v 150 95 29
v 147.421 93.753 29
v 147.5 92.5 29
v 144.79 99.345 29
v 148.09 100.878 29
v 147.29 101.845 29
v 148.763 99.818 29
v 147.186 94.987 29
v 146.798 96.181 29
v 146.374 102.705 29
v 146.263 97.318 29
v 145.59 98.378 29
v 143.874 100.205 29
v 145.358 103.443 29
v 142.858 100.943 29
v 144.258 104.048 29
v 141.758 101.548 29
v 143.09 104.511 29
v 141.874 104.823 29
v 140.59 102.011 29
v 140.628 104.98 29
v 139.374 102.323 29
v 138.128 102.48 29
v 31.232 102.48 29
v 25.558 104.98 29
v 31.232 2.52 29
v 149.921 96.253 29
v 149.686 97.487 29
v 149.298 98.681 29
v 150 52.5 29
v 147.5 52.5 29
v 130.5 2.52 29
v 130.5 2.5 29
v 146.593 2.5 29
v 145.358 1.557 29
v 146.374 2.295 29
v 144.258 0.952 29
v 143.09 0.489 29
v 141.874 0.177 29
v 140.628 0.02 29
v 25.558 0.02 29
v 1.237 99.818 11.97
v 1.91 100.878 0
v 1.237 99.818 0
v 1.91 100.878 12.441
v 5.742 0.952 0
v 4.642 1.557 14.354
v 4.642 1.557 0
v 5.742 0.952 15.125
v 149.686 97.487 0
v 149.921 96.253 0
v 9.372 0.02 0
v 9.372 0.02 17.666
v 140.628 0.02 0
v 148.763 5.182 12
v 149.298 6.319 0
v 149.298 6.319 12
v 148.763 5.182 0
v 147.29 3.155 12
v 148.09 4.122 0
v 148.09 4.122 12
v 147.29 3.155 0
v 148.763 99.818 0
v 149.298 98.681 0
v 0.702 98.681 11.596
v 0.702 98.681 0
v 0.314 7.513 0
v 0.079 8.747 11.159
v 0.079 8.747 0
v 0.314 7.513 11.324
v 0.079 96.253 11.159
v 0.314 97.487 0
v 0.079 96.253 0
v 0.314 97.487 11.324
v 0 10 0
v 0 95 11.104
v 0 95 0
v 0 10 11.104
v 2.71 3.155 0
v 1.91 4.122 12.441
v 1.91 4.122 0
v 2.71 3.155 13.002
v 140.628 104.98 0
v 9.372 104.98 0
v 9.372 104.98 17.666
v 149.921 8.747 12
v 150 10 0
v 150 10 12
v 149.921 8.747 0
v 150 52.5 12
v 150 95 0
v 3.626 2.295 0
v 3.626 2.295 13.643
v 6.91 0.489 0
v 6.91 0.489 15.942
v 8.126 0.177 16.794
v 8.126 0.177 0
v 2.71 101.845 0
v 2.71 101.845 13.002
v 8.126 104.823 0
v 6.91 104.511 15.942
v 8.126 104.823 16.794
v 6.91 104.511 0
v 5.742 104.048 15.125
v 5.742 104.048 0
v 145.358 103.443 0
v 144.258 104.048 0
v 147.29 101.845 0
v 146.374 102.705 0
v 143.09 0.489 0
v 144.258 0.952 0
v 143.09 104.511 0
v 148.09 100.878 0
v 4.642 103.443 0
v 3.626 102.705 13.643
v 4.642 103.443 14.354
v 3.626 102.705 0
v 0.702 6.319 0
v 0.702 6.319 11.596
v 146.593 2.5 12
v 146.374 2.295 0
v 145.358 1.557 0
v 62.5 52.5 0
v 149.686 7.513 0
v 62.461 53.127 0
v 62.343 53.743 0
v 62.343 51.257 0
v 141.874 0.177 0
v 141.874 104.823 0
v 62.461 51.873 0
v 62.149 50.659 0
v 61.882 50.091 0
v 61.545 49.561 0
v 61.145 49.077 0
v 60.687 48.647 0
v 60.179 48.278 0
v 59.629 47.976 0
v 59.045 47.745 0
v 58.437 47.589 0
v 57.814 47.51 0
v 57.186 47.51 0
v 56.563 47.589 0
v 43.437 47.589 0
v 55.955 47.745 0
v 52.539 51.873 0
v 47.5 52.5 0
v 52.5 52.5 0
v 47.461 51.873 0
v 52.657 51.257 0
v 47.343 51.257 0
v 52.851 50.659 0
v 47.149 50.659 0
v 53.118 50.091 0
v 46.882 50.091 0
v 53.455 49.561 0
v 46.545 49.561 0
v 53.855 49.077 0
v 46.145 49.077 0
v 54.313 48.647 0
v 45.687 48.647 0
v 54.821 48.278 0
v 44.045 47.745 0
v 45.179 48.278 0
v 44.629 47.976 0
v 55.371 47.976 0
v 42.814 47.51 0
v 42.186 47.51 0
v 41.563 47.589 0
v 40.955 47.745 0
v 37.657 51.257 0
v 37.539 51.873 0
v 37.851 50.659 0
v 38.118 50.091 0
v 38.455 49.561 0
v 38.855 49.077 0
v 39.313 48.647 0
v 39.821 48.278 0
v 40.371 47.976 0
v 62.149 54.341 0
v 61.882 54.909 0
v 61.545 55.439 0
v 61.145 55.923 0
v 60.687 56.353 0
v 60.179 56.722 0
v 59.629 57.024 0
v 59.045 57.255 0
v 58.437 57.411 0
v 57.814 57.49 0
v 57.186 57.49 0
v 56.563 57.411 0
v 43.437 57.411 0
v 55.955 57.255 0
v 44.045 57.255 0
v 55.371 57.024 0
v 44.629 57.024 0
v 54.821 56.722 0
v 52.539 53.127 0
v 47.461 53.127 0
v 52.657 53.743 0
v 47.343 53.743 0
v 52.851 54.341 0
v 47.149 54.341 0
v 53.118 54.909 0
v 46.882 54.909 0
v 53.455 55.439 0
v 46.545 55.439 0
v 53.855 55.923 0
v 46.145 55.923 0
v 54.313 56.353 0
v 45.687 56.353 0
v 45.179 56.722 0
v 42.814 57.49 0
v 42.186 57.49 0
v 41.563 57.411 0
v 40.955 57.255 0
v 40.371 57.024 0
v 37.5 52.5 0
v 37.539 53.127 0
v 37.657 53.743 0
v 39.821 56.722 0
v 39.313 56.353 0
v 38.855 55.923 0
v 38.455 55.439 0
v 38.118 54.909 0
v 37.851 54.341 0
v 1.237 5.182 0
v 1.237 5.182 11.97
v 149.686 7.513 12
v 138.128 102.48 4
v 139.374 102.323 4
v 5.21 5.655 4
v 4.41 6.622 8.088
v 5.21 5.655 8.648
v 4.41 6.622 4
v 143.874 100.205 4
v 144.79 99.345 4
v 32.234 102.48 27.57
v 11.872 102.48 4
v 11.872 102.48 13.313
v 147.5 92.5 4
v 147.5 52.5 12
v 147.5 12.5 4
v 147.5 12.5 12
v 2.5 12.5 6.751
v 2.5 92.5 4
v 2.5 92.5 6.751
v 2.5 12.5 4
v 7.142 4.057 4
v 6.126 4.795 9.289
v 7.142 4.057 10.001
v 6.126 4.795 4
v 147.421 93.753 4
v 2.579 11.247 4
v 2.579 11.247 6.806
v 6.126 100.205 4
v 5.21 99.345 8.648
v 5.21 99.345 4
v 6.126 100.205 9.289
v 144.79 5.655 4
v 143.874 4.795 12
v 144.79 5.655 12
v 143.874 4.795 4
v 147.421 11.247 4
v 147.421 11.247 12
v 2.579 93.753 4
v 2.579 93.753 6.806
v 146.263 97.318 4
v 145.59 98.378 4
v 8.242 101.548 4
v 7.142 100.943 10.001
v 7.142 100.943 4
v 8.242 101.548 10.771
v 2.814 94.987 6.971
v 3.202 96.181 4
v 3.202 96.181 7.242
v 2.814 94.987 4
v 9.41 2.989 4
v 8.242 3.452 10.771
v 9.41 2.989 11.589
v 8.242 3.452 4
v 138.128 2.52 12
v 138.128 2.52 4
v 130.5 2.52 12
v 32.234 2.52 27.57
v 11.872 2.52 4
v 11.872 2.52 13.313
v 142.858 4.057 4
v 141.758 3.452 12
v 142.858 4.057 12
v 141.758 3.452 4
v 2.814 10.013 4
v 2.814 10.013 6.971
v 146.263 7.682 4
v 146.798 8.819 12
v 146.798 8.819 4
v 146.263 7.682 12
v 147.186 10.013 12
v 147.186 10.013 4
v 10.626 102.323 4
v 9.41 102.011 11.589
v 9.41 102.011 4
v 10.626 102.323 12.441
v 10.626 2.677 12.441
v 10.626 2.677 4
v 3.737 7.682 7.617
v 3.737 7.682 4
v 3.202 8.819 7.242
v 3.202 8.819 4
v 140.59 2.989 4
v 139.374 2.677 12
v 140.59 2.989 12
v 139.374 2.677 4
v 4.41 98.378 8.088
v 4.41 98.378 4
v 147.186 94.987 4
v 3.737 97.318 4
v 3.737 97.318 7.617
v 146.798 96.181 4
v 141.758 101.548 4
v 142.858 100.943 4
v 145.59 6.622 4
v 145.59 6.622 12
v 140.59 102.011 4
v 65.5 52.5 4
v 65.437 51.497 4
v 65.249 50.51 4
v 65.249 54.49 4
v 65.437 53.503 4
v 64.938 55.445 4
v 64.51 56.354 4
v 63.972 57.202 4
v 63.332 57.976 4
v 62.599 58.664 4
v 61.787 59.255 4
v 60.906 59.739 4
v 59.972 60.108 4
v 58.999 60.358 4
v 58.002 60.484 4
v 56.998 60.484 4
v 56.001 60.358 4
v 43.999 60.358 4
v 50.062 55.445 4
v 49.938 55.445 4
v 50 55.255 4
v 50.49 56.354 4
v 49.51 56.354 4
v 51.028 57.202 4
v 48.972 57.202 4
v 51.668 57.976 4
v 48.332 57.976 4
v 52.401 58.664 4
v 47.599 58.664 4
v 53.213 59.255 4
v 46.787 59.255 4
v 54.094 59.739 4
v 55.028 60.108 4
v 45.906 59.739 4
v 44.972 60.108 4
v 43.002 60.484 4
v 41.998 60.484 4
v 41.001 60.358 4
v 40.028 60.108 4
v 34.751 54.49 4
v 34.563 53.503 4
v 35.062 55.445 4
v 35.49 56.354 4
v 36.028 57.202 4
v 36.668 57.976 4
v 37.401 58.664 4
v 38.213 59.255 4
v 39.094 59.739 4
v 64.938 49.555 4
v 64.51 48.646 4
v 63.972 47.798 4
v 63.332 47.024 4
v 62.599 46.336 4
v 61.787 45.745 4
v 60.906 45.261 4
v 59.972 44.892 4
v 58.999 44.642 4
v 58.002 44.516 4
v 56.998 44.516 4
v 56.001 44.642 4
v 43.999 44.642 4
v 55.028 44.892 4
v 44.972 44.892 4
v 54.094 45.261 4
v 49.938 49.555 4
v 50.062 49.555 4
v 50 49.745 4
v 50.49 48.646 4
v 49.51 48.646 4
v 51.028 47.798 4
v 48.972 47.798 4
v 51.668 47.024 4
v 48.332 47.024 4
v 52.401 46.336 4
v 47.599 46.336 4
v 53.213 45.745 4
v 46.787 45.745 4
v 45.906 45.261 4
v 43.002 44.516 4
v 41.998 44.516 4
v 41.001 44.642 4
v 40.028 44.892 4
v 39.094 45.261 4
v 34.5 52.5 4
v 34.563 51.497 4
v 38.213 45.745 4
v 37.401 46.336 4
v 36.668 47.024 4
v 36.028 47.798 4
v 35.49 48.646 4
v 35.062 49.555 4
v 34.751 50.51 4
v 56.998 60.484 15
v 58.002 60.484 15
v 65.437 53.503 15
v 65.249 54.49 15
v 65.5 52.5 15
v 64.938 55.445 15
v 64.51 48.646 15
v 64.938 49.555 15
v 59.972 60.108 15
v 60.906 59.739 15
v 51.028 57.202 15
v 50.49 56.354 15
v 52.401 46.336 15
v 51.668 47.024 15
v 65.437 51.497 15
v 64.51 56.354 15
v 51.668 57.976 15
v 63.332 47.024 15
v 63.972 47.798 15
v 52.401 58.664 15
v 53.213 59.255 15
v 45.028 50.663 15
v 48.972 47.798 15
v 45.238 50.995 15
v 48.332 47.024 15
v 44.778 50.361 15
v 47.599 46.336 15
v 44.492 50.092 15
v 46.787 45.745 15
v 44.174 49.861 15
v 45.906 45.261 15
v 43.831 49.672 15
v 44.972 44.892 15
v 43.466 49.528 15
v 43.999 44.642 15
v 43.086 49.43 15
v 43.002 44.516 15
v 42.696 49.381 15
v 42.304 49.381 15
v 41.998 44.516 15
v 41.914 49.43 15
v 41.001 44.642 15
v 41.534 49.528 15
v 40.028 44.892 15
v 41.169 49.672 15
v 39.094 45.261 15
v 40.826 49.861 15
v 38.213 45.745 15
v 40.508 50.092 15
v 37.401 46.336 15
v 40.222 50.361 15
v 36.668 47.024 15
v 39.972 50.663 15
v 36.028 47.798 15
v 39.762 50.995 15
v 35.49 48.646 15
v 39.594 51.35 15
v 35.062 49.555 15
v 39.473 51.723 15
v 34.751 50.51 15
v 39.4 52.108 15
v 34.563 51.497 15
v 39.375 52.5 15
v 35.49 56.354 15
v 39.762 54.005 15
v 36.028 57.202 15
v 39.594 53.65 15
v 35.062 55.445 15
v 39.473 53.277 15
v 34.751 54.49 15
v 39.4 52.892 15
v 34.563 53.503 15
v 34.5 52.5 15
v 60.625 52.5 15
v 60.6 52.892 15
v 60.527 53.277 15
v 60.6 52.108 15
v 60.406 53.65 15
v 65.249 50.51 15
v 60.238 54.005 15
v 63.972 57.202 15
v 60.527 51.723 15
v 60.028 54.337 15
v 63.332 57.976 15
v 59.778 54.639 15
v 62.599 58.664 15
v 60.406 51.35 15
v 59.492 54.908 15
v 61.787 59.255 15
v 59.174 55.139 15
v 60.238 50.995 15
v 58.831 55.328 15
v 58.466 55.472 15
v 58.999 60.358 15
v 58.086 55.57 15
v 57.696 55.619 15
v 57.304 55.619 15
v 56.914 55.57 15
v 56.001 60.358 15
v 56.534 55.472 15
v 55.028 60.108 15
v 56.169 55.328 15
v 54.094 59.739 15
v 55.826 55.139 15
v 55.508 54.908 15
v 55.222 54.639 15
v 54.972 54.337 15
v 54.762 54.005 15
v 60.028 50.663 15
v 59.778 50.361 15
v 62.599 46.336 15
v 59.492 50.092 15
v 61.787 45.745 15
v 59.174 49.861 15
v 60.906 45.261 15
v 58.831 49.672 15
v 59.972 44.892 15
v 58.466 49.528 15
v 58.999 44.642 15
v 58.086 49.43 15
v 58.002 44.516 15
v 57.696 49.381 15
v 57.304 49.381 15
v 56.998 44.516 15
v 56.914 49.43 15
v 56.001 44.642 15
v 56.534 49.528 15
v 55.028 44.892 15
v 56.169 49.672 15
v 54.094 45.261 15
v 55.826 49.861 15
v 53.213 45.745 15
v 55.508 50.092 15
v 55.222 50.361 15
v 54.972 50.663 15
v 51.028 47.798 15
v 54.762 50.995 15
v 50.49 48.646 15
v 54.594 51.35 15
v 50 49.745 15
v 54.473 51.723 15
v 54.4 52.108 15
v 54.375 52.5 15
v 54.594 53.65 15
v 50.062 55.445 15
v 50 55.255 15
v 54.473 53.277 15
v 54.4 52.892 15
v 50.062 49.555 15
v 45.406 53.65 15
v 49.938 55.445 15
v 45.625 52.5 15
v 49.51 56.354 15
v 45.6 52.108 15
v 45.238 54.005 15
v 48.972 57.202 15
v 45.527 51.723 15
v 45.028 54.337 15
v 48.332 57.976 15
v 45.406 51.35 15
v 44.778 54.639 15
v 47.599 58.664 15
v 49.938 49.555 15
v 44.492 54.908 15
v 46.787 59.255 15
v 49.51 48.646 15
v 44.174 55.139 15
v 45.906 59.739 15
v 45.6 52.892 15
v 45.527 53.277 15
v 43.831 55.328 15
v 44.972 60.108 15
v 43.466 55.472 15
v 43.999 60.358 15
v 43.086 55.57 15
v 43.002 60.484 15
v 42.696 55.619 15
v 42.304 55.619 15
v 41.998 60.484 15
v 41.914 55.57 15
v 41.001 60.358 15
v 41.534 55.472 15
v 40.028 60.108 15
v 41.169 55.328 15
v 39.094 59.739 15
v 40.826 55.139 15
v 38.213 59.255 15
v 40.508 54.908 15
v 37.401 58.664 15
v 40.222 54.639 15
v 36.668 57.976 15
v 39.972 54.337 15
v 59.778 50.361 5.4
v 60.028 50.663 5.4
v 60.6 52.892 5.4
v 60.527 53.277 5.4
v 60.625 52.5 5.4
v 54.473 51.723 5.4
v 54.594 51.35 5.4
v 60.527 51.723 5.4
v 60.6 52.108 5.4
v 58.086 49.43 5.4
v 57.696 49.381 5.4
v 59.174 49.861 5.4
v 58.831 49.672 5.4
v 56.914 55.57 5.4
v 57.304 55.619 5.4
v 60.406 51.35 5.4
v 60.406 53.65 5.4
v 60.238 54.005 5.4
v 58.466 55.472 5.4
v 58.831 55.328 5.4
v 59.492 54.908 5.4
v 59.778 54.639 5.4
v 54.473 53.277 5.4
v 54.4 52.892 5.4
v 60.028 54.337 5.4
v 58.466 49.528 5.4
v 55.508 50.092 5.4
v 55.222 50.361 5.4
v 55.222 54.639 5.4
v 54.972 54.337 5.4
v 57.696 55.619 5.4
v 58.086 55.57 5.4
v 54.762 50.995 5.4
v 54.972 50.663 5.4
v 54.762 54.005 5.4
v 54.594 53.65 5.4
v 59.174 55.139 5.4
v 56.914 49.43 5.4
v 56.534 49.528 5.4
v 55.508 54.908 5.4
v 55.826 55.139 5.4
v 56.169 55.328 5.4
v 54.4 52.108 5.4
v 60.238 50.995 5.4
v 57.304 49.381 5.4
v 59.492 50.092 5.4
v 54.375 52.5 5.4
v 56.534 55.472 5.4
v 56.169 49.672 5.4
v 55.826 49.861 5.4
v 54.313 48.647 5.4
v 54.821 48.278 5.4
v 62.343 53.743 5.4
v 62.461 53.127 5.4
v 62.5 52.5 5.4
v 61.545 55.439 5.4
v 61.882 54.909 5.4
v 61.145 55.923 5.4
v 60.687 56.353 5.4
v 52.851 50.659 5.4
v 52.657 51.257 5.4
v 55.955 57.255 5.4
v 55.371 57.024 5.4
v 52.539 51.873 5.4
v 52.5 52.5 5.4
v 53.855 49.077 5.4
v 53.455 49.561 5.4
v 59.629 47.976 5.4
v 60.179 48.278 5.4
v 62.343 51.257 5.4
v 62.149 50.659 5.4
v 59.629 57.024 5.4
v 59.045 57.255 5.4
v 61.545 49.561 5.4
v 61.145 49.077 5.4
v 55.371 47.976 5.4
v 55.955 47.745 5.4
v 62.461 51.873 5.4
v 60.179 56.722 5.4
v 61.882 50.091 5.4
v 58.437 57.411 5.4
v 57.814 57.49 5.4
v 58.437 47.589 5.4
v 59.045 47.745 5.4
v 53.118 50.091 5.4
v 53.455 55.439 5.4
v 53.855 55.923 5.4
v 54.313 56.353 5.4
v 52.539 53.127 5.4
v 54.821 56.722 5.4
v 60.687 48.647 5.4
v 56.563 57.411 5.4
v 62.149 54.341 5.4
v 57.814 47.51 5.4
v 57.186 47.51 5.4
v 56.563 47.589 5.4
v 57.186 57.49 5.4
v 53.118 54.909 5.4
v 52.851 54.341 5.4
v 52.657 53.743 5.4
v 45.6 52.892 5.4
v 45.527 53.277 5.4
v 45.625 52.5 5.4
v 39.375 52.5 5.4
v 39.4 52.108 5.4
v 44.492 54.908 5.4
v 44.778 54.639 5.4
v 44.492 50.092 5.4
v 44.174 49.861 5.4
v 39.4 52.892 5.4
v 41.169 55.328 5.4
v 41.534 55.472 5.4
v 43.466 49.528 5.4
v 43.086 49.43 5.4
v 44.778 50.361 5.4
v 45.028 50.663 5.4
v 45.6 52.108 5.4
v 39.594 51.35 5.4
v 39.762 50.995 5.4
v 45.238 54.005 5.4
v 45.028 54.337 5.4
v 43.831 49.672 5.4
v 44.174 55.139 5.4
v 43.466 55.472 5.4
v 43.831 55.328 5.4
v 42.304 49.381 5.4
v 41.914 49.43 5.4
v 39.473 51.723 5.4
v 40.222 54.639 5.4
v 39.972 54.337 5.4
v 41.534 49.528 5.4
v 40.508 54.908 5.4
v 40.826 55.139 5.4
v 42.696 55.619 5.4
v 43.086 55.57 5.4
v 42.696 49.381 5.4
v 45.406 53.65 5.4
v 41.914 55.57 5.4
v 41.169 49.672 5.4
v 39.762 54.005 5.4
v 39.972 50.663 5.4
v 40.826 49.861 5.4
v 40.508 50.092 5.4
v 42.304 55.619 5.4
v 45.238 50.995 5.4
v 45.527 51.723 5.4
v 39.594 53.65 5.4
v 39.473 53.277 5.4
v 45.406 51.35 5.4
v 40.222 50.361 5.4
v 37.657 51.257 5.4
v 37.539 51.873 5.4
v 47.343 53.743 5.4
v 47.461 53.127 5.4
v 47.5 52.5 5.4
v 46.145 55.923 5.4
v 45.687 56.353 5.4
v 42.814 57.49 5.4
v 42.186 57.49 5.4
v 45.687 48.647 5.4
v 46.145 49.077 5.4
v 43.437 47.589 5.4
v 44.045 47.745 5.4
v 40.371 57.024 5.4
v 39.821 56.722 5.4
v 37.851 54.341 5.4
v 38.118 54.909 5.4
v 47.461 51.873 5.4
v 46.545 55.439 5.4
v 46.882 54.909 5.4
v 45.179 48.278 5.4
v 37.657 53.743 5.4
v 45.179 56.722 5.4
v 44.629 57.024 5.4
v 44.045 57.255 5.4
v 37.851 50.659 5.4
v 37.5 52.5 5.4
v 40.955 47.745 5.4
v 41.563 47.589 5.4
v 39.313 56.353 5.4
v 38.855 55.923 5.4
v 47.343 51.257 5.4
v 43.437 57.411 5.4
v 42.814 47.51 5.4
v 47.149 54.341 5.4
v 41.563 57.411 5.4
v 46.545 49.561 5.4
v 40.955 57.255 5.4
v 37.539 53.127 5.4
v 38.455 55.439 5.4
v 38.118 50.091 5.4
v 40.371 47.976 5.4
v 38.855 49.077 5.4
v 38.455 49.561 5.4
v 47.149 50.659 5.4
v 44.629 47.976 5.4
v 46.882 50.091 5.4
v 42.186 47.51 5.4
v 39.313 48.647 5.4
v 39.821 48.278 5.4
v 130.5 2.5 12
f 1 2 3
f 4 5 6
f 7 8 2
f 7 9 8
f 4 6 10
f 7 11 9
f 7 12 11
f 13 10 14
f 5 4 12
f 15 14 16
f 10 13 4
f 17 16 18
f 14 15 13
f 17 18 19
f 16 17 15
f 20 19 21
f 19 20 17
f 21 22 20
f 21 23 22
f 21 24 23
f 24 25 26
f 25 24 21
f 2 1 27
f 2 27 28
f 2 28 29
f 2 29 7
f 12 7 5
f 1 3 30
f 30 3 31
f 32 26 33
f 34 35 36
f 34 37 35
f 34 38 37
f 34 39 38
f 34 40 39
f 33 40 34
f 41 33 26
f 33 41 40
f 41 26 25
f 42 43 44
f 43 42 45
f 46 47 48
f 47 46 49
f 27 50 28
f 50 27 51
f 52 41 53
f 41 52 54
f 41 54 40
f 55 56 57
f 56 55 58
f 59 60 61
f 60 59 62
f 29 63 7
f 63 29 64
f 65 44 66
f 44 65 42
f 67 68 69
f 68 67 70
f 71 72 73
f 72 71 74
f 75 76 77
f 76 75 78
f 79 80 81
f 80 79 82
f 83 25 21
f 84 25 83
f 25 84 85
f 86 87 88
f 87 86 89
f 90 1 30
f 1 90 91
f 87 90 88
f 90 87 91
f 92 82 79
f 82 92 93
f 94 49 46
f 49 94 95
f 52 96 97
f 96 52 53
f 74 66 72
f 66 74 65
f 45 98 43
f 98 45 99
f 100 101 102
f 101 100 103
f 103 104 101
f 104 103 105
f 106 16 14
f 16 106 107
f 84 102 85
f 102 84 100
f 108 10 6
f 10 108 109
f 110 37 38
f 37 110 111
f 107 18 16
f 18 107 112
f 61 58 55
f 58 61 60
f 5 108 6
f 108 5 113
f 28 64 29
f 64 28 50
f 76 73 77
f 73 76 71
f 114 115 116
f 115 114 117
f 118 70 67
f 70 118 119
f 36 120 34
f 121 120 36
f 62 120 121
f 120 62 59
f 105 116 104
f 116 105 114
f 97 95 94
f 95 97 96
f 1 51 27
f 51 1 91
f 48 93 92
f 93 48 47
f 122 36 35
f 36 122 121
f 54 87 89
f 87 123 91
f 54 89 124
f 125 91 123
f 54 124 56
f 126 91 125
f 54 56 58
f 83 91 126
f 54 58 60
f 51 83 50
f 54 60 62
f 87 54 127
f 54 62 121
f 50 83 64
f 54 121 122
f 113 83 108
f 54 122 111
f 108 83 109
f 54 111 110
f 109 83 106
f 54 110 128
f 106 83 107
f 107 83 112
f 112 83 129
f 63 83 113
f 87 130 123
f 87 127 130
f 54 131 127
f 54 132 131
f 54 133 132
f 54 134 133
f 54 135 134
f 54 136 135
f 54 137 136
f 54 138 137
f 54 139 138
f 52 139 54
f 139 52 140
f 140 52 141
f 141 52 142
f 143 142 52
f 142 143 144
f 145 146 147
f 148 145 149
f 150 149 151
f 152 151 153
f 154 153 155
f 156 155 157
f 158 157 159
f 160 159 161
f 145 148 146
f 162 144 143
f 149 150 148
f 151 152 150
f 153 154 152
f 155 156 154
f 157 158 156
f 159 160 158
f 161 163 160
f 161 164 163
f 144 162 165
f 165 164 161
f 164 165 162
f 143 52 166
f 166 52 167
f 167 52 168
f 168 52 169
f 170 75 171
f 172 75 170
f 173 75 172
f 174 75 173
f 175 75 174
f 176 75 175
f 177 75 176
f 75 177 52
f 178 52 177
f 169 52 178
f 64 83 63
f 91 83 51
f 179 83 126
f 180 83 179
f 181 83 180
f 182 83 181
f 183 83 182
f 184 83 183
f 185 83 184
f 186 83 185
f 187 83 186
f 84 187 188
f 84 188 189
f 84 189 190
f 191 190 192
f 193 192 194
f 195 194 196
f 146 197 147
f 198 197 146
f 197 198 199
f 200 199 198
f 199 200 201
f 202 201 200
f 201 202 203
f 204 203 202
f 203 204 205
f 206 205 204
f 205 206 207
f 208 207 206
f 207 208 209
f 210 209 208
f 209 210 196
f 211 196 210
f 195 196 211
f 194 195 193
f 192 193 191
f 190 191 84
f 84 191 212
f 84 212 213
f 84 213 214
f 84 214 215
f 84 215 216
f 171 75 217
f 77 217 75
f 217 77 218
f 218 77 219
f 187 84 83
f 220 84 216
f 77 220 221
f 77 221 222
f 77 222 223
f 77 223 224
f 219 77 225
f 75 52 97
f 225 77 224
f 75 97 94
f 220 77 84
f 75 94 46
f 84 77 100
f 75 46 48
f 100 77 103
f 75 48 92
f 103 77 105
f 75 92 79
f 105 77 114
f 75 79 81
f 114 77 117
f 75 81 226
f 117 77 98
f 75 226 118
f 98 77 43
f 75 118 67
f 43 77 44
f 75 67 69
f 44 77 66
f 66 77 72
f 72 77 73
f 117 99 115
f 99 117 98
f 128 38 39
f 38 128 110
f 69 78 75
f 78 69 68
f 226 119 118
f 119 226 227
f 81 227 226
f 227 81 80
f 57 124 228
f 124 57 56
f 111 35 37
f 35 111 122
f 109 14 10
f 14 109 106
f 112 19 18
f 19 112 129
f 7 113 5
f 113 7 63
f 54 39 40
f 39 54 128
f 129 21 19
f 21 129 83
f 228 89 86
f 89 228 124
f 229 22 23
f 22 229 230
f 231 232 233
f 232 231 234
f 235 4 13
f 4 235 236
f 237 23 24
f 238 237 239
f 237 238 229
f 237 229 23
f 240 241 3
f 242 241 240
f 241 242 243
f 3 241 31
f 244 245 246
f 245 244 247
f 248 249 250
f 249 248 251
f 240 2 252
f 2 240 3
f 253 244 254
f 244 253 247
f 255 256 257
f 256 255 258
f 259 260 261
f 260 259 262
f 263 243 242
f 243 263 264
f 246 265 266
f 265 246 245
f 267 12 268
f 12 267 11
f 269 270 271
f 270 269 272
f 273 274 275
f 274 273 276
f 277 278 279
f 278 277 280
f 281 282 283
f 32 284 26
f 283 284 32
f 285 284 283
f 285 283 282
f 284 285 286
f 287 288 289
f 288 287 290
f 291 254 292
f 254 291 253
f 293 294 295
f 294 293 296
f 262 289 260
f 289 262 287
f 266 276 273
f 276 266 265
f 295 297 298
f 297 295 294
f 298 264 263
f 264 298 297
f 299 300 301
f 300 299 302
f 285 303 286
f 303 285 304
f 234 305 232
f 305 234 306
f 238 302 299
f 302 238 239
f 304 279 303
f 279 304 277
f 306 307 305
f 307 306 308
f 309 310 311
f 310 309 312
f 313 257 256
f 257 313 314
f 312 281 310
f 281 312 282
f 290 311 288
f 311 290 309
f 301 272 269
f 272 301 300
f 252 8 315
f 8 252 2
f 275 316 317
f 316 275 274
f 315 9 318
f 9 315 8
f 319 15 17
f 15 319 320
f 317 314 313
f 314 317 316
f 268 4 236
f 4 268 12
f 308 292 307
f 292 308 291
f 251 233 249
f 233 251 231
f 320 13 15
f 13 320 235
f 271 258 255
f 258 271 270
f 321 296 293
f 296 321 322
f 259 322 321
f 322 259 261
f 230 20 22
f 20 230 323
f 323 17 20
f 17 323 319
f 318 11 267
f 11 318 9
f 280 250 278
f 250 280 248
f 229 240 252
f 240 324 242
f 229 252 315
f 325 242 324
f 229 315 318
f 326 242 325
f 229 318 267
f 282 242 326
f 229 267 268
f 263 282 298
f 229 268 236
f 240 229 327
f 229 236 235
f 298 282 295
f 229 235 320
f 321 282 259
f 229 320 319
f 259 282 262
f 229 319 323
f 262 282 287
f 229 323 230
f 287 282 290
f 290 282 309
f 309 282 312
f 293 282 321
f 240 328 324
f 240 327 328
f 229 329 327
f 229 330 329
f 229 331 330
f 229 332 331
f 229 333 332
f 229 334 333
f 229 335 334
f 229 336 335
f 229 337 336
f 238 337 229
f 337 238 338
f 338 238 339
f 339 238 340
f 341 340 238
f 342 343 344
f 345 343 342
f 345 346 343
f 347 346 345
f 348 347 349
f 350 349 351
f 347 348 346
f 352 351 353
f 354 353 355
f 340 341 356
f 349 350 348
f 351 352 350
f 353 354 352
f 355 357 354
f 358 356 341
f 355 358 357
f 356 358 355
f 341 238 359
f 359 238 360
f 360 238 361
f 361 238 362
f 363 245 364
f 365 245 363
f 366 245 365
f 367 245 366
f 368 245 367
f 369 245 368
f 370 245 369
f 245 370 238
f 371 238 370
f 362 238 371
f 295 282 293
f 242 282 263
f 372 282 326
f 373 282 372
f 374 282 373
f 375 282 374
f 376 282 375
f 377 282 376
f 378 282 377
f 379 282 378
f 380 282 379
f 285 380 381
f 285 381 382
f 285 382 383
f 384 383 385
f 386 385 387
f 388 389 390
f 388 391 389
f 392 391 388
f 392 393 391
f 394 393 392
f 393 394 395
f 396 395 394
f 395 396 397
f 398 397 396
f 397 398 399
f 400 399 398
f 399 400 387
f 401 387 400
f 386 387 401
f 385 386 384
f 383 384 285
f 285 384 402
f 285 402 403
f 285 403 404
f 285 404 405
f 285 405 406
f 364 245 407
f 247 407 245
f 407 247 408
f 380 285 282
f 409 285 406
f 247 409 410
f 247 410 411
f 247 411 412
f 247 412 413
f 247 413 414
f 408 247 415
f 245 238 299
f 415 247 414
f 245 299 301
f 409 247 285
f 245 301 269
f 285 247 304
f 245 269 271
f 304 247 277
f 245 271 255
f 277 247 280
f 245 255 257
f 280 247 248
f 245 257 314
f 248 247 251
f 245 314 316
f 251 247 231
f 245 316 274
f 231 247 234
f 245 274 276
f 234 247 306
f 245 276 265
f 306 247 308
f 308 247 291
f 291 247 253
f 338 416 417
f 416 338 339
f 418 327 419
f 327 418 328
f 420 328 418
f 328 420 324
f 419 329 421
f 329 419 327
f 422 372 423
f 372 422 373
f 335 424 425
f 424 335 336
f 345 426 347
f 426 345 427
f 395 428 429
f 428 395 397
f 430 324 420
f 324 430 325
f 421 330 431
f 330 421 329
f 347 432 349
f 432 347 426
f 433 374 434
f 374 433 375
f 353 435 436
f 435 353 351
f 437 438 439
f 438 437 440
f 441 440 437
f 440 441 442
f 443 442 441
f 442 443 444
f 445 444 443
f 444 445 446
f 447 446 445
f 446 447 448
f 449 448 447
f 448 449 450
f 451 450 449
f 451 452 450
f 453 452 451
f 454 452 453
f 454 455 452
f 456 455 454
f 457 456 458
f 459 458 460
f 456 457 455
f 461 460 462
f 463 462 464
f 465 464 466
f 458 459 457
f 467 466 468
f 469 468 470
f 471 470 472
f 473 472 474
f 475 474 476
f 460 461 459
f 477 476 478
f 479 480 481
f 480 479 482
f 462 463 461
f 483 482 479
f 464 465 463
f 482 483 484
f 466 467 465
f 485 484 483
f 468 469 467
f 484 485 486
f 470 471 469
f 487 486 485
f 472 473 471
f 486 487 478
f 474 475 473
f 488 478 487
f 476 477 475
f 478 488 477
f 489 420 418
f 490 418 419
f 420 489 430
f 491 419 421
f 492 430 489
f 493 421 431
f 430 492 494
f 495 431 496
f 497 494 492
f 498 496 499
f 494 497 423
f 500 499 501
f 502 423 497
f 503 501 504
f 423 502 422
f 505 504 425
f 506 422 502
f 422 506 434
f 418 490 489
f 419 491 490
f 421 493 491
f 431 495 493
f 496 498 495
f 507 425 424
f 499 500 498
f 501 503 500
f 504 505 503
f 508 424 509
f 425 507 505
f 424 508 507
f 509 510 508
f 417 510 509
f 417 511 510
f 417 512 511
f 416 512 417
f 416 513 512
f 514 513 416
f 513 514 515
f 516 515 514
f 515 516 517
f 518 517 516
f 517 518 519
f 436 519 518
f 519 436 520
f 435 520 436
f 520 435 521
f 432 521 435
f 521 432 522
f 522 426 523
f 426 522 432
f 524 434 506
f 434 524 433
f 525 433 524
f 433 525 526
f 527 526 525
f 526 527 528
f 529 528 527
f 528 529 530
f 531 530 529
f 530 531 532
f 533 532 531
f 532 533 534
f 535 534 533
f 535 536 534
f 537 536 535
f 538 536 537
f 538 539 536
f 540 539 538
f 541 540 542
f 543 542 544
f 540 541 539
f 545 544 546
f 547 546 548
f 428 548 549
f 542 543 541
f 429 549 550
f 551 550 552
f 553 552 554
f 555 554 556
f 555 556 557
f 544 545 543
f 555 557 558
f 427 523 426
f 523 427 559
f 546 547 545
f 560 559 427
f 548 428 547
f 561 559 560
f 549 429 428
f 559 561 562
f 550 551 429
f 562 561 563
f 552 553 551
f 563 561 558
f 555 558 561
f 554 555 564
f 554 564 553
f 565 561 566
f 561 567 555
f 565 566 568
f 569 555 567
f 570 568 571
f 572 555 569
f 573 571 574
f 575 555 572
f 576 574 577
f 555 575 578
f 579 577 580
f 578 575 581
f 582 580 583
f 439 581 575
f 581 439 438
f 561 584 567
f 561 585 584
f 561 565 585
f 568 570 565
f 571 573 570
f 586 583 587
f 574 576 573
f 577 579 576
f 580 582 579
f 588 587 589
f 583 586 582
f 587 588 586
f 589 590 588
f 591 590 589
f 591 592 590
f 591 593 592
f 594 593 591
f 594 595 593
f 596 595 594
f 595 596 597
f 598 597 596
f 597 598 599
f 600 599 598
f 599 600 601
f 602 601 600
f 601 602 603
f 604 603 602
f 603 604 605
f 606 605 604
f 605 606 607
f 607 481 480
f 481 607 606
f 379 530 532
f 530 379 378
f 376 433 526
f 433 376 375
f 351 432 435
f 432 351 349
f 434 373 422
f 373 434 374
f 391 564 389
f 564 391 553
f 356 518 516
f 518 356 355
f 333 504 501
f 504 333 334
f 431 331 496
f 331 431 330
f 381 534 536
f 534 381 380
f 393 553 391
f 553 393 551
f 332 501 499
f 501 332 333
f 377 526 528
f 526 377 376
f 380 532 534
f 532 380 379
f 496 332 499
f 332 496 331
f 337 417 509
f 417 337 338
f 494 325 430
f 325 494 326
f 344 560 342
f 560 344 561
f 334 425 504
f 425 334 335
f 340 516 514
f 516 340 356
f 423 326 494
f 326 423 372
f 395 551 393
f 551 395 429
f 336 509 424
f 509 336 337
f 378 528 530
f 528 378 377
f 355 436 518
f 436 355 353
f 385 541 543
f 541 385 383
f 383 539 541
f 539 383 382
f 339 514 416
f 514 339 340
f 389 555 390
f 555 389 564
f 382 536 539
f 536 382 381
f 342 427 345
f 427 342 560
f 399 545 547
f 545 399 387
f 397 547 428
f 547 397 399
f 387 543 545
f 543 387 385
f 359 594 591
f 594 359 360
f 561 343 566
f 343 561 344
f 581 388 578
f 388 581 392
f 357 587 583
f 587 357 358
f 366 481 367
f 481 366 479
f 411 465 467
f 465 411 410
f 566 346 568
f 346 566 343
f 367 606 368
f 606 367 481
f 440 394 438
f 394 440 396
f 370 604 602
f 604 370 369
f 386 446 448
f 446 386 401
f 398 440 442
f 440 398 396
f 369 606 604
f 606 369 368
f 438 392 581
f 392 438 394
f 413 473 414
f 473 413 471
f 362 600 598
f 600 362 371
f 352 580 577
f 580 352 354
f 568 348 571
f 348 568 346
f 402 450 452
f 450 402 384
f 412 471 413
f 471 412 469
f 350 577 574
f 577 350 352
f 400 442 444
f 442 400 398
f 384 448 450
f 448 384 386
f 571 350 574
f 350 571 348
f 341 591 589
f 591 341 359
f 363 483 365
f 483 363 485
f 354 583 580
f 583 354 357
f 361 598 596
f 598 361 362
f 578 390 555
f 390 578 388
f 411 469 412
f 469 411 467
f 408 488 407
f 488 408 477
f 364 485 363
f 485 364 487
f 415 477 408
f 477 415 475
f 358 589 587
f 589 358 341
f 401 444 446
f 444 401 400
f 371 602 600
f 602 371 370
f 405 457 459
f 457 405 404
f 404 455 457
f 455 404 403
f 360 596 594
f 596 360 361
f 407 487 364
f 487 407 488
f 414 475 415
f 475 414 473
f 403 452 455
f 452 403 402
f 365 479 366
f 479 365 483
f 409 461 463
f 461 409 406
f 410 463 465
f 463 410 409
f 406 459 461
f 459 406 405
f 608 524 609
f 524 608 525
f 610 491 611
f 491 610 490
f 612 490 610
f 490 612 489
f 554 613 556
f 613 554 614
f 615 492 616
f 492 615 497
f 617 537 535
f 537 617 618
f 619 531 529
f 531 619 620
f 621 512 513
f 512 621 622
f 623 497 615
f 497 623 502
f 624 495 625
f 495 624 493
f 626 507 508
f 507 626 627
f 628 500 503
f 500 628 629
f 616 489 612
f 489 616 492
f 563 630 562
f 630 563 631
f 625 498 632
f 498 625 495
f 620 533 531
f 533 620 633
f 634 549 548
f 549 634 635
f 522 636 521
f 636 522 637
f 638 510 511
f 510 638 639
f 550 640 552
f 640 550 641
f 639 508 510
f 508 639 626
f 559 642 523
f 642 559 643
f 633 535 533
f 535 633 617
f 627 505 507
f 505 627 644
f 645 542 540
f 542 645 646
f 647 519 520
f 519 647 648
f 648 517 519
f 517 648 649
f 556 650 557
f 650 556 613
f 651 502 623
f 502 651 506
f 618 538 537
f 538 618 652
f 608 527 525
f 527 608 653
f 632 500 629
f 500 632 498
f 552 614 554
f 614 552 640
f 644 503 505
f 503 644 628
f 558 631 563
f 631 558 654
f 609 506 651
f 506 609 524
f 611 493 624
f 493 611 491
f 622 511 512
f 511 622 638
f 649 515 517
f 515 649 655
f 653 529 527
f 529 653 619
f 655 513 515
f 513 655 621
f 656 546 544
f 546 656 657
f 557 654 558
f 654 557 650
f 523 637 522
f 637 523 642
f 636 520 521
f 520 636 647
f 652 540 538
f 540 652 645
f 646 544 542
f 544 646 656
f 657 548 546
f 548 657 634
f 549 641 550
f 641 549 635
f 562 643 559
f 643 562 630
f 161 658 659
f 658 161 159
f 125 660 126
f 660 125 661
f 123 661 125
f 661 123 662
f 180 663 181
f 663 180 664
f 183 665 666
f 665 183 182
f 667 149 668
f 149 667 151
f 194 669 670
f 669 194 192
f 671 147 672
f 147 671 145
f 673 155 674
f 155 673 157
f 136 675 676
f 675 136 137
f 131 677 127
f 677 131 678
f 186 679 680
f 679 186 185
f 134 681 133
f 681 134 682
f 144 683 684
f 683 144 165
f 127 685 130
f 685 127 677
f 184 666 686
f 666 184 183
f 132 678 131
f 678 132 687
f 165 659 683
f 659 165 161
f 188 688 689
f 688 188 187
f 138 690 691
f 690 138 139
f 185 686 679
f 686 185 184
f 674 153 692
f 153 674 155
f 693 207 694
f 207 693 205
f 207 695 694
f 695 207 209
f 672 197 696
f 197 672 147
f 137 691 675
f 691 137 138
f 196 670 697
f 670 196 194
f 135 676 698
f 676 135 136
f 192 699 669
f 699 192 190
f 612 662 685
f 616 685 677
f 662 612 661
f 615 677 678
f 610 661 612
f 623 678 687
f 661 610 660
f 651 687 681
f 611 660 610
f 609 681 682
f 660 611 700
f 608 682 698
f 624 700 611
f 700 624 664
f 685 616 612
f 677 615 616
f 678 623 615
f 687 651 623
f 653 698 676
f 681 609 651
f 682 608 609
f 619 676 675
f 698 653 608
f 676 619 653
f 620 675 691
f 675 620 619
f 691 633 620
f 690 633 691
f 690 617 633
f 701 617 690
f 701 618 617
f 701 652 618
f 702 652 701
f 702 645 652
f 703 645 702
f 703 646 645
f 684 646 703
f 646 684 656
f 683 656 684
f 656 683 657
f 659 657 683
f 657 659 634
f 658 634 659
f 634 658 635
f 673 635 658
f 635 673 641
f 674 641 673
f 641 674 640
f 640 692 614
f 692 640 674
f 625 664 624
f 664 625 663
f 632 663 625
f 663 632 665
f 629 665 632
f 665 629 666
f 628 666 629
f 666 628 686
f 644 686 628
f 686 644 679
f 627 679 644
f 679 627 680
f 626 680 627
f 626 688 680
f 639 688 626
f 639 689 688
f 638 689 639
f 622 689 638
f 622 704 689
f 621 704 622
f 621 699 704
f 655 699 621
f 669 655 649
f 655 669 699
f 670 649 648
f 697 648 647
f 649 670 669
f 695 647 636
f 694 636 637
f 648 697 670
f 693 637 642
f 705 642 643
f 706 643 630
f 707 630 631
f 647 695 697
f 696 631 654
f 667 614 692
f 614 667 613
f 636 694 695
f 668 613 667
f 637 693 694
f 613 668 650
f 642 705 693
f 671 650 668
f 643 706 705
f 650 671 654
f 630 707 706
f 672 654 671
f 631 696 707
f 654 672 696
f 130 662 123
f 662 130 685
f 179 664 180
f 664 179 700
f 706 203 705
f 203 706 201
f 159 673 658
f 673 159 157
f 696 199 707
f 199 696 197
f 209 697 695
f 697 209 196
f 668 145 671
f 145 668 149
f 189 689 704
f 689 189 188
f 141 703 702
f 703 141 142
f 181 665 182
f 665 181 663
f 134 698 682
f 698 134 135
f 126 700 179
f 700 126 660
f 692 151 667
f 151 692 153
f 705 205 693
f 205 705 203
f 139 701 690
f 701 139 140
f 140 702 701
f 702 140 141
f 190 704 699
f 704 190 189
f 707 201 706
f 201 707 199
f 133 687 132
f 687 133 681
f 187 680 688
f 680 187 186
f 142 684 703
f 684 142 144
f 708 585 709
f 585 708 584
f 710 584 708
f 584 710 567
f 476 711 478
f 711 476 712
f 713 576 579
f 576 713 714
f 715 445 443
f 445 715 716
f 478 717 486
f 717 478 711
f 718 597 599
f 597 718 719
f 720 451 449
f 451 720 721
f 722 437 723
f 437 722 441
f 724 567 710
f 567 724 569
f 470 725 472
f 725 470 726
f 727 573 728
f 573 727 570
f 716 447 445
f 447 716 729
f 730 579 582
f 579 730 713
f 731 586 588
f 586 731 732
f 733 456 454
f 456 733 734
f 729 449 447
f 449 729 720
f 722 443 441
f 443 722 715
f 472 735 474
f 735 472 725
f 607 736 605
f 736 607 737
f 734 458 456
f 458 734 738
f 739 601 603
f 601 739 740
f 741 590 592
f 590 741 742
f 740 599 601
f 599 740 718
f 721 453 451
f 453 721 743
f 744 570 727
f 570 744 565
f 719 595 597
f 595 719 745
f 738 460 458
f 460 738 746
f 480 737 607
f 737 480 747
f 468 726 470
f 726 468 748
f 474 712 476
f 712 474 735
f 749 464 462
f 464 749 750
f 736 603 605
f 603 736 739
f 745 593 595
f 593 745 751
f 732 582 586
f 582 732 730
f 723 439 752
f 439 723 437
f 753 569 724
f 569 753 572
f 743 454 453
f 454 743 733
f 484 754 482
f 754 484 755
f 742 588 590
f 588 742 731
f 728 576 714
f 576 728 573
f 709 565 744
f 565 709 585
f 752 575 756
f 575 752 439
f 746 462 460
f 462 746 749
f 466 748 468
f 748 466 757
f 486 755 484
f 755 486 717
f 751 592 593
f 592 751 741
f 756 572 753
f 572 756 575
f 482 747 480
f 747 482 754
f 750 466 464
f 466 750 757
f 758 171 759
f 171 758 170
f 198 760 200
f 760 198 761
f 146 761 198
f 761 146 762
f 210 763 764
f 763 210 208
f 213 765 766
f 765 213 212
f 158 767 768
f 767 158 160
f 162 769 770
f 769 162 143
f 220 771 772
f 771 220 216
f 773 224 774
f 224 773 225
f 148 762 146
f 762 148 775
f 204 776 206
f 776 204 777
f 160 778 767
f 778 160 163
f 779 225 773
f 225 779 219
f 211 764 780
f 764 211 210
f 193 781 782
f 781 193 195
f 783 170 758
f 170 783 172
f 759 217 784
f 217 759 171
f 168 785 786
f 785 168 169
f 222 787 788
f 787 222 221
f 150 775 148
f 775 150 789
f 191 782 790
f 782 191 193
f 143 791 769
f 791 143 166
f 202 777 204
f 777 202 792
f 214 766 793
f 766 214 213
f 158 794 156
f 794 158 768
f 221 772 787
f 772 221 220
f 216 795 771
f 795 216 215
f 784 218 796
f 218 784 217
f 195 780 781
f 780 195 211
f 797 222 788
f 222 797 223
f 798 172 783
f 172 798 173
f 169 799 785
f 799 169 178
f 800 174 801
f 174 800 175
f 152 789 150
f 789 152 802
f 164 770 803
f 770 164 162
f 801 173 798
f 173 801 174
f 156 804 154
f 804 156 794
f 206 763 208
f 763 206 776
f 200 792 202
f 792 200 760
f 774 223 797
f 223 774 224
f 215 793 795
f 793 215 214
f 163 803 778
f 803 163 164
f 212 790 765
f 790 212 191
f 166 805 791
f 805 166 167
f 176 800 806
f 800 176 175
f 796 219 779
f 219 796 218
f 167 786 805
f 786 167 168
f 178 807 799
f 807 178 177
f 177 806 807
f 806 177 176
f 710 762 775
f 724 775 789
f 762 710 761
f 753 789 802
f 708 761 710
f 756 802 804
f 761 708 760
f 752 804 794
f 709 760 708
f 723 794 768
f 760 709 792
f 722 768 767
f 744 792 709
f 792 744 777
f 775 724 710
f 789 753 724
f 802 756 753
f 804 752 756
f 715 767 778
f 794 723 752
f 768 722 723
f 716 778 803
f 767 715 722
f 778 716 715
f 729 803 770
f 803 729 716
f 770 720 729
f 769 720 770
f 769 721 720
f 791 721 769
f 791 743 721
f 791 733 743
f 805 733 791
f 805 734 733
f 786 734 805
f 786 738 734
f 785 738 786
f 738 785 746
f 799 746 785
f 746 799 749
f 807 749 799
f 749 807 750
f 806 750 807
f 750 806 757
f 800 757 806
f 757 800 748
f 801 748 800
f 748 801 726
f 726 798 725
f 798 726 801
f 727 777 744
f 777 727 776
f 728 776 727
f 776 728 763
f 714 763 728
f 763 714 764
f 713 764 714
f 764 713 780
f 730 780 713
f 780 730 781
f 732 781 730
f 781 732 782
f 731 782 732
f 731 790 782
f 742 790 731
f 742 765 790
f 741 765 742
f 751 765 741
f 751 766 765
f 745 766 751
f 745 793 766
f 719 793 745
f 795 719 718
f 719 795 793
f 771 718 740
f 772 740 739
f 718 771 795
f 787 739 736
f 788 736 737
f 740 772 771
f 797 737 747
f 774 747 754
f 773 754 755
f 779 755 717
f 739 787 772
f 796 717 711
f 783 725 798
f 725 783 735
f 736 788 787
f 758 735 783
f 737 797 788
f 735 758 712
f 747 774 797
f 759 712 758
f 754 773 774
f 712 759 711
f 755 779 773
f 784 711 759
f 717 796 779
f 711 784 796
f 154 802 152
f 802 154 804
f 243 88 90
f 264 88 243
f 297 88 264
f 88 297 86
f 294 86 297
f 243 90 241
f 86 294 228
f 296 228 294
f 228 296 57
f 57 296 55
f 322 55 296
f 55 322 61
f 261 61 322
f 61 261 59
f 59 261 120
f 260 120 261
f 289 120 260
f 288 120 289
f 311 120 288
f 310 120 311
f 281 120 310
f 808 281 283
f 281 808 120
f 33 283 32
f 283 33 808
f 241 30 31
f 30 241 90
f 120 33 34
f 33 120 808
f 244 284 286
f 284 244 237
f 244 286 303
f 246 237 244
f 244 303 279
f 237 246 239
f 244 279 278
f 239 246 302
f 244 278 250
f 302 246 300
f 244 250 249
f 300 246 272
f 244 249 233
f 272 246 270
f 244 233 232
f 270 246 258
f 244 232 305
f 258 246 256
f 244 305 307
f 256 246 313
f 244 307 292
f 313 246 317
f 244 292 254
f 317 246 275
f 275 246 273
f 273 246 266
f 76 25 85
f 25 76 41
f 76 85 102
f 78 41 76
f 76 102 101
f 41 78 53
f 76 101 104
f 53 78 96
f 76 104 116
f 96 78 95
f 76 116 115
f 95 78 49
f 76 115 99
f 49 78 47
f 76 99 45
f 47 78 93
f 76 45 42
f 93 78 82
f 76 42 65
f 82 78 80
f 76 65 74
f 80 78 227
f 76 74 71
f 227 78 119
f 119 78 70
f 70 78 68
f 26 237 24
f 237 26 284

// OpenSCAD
// file: LoadCellRx.scad
/* TAL220 Load Cell Rx - Receives cable (base) end of TAL220
    Copyright (C) 2019 Benjamin Hubbard

    This program is free software: you can redistribute it and/or modify
    it under the terms of the GNU General Public License as published by
    the Free Software Foundation, either version 3 of the License, or
    (at your option) any later version.

    This program is distributed in the hope that it will be useful,
    but WITHOUT ANY WARRANTY; without even the implied warranty of
    MERCHANTABILITY or FITNESS FOR A PARTICULAR PURPOSE.  See the
    GNU General Public License for more details.

    You should have received a copy of the GNU General Public License
    along with this program.  If not, see <https://www.gnu.org/licenses/>.
 */

// General resolution.
$fn = 50;

// Place samples.
translate([ -10, -10, 0 ]) TAL220("M4");
translate([ -10, 10, 0 ]) TAL220("M5");
translate([ 20, 10, 0 ]) TAL221();

translate([ -10, -30, 0 ]) TAL220("M4", 2);
translate([ -10, 30, 0 ]) TAL220("M5", 2);
translate([ 20, -10, 0 ]) TAL221(2);

// Nut cutout.
// E = corner to corner.
E_M3 = 6.2; // M3: 6.01-6.35
E_M4 = 9;   // M4: 7.66-8.08
E_M5 = 10;  // M5: 8.79-9.24

// M = thickness.
M_M3 = 2.4; // M3: 2.15-2.40
M_M4 = 4.4; // M4: 2.90-3.20 Screw head height = 4
M_M5 = 5.4; // M5: 4.40-4.70 Screw head height = 5

// Thru hole diameters (M4 or M5).
diam_M3 = 4;    // 3.5;
diam_M4 = 5;    // 4.5;
diam_M5 = 6.25; // 5.5;

// Screw locations.
holeX_220 = [ 7.5, -7.5 ];
holeY_220 = [ 0, 0 ];

holeX_221 = [ 0, 0 ];
holeY_221 = [ -3, 3 ];

// Large beam strain gage.
module TAL220(MX, Cutout)
{
    // 0 = Full stand-off.
    // 1 = Solid Boss.
    // 2 = Screw Cutout.
    if (is_undef(Cutout) || Cutout == 0)
    {
        if (MX == "M4")
        {
            Rx(E_M4, M_M4, holeX_220, holeY_220, diam_M4);
        }

        if (MX == "M5")
        {
            Rx(E_M5, M_M5, holeX_220, holeY_220, diam_M5);
        }
    }

    if (Cutout == 1)
    {
        if (MX == "M4")
        {
            RxBoss(holeX_220, holeY_220, E_M4);
        }

        if (MX == "M5")
        {
            RxBoss(holeX_220, holeY_220, E_M5);
        }
    }

    if (Cutout == 2)
    {
        if (MX == "M4")
        {
            RxThruHole(E_M4, M_M5, holeX_220, holeY_220, diam_M4);
        }

        if (MX == "M5")
        {
            RxThruHole(E_M5, M_M5, holeX_220, holeY_220, diam_M5);
        }
    }
}

// Small beam strain gage.
module TAL221(Cutout)
{
    if (is_undef(Cutout) || Cutout == 0)
    {
        Rx(E_M3, M_M3, holeX_221, holeY_221, diam_M3);
    }

    if (Cutout == 1)
    {
        RxBoss(holeX_221, holeY_221, E_M3);
    }

    if (Cutout == 2)
    {
        RxThruHole(E_M3, M_M3, holeX_221, holeY_221, diam_M3);
    }
}

// Building Blocks.
// Boss for screw to pass through.
module RxBoss(holeX, holeY, E)
{
    for (i = [0:1])
    {
        translate([ holeX[i], holeY[i], 0 ]) cylinder(d = E + 6, h = 15);
    }
}

// Through hole (holds screw and nut).
module RxThruHole(E, M, holeX, holeY, diam)
{
    // Thru hole
    for (i = [0:1])
    {
        translate([ holeX[i], holeY[i], 0 ]) cylinder(d = diam, h = 15);

        // Nut receiver
        translate([ holeX[i], holeY[i], 0 ]) cylinder(d = E, h = M); //, $fn=6);
    }
}

// Build the full receiver (thru hole cut out of boss).
module Rx(E, M, holeX, holeY, diam)
{
    translate([ 0, 0, 0 ]) difference()
    {
        RxBoss(holeX, holeY, E);
        RxThruHole(E, M, holeX, holeY, diam);
    }
}
// main file
/* OS Nano Balance - Base: Accepts load cell, holds electronics.
    Copyright (C) 2019 Benjamin Hubbard

    This program is free software: you can redistribute it and/or modify
    it under the terms of the GNU General Public License as published by
    the Free Software Foundation, either version 3 of the License, or
    (at your option) any later version.

    This program is distributed in the hope that it will be useful,
    but WITHOUT ANY WARRANTY; without even the implied warranty of
    MERCHANTABILITY or FITNESS FOR A PARTICULAR PURPOSE.  See the
    GNU General Public License for more details.

    You should have received a copy of the GNU General Public License
    along with this program.  If not, see <https://www.gnu.org/licenses/>.
*/

$fn = 50;

// Library of LoadCell receivers.
use <LoadCellRx.scad>;

// Snap Pieces.
//use <snap_joint.scad>;

// Bed dimensions.
minkowskiDim = [ 10, 10, 1 ];
oDim = [ 150, 105, 30 ]; //[150, 150, 10];
iDim = [ 145, 100, 26 ]; //[144, 144, 6];
// Dimensional difference - for placement (also = shell thickness * 2)
diff = oDim - iDim;

// Front bevel.
bevelL = 39.35;

// Switch dimensions.
swL = 21.5;
swW = 13;

// Screen dimensions.

// Make the main body.
module mainBody()
{
    difference()
    {
        union()
        {
            translate([ minkowskiDim[0], minkowskiDim[1], 0 ]) difference()
            {
                minkowski()
                {
                    cube(oDim - minkowskiDim * 2);
                    cylinder(r = minkowskiDim[0], h = minkowskiDim[2]);
                }
                minkowski()
                {
                    translate([ diff[0] / 2, diff[1] / 2, diff[2] ]) cube(iDim - minkowskiDim * 2);
                    cylinder(r = minkowskiDim[0], h = minkowskiDim[2] * 2);
                }
            }
            // Place the TAL221 at the center. The top of the hex cutout is at the origin of the Rx unit.
            // translate([oDim[0]/2, oDim[1]/2, 0])TAL221(1);

            // Place the TAL220 at the center. It's sized so that it fits around the TAL221.
            translate([ oDim[0] / 3, oDim[1] / 2, 0 ]) TAL220("M5", 1);
        }

        // Place the TAL221 at the center. The top of the hex cutout is at the origin of the Rx unit.
        // translate([oDim[0]/2, oDim[1]/2, 0])TAL221(2);

        // Place the TAL220 at the center. It's sized so that it fits around the TAL221.
        translate([ oDim[0] / 3, oDim[1] / 2, 0 ]) TAL220("M5", 2);

        // Cut out the back for load cell rating visibility and nano access.
        translate([ iDim[0] * 0.9, diff[1] / 2, 8 + diff[2] ]) cube([ iDim[0] * 0.2, iDim[1] / 2, iDim[2] ]);
    }
}

difference()
{
    mainBody();
    // Front bevel cutout.
    translate([ 0, 0, diff[0] ]) rotate([ 0, -35, 0 ]) cube([ bevelL, oDim[1], bevelL ]);
}

intersection()
{
    translate([ minkowskiDim[0], minkowskiDim[1], 0 ]) minkowski()
    {
        cube(oDim - minkowskiDim * 2);
        cylinder(r = minkowskiDim[0], h = minkowskiDim[2]);
    }

    translate([ 0, 0, diff[0] ]) rotate([ 0, -35, 0 ]) cube([ bevelL, oDim[1], diff[0] ]);
}

// Place the arduino nano
